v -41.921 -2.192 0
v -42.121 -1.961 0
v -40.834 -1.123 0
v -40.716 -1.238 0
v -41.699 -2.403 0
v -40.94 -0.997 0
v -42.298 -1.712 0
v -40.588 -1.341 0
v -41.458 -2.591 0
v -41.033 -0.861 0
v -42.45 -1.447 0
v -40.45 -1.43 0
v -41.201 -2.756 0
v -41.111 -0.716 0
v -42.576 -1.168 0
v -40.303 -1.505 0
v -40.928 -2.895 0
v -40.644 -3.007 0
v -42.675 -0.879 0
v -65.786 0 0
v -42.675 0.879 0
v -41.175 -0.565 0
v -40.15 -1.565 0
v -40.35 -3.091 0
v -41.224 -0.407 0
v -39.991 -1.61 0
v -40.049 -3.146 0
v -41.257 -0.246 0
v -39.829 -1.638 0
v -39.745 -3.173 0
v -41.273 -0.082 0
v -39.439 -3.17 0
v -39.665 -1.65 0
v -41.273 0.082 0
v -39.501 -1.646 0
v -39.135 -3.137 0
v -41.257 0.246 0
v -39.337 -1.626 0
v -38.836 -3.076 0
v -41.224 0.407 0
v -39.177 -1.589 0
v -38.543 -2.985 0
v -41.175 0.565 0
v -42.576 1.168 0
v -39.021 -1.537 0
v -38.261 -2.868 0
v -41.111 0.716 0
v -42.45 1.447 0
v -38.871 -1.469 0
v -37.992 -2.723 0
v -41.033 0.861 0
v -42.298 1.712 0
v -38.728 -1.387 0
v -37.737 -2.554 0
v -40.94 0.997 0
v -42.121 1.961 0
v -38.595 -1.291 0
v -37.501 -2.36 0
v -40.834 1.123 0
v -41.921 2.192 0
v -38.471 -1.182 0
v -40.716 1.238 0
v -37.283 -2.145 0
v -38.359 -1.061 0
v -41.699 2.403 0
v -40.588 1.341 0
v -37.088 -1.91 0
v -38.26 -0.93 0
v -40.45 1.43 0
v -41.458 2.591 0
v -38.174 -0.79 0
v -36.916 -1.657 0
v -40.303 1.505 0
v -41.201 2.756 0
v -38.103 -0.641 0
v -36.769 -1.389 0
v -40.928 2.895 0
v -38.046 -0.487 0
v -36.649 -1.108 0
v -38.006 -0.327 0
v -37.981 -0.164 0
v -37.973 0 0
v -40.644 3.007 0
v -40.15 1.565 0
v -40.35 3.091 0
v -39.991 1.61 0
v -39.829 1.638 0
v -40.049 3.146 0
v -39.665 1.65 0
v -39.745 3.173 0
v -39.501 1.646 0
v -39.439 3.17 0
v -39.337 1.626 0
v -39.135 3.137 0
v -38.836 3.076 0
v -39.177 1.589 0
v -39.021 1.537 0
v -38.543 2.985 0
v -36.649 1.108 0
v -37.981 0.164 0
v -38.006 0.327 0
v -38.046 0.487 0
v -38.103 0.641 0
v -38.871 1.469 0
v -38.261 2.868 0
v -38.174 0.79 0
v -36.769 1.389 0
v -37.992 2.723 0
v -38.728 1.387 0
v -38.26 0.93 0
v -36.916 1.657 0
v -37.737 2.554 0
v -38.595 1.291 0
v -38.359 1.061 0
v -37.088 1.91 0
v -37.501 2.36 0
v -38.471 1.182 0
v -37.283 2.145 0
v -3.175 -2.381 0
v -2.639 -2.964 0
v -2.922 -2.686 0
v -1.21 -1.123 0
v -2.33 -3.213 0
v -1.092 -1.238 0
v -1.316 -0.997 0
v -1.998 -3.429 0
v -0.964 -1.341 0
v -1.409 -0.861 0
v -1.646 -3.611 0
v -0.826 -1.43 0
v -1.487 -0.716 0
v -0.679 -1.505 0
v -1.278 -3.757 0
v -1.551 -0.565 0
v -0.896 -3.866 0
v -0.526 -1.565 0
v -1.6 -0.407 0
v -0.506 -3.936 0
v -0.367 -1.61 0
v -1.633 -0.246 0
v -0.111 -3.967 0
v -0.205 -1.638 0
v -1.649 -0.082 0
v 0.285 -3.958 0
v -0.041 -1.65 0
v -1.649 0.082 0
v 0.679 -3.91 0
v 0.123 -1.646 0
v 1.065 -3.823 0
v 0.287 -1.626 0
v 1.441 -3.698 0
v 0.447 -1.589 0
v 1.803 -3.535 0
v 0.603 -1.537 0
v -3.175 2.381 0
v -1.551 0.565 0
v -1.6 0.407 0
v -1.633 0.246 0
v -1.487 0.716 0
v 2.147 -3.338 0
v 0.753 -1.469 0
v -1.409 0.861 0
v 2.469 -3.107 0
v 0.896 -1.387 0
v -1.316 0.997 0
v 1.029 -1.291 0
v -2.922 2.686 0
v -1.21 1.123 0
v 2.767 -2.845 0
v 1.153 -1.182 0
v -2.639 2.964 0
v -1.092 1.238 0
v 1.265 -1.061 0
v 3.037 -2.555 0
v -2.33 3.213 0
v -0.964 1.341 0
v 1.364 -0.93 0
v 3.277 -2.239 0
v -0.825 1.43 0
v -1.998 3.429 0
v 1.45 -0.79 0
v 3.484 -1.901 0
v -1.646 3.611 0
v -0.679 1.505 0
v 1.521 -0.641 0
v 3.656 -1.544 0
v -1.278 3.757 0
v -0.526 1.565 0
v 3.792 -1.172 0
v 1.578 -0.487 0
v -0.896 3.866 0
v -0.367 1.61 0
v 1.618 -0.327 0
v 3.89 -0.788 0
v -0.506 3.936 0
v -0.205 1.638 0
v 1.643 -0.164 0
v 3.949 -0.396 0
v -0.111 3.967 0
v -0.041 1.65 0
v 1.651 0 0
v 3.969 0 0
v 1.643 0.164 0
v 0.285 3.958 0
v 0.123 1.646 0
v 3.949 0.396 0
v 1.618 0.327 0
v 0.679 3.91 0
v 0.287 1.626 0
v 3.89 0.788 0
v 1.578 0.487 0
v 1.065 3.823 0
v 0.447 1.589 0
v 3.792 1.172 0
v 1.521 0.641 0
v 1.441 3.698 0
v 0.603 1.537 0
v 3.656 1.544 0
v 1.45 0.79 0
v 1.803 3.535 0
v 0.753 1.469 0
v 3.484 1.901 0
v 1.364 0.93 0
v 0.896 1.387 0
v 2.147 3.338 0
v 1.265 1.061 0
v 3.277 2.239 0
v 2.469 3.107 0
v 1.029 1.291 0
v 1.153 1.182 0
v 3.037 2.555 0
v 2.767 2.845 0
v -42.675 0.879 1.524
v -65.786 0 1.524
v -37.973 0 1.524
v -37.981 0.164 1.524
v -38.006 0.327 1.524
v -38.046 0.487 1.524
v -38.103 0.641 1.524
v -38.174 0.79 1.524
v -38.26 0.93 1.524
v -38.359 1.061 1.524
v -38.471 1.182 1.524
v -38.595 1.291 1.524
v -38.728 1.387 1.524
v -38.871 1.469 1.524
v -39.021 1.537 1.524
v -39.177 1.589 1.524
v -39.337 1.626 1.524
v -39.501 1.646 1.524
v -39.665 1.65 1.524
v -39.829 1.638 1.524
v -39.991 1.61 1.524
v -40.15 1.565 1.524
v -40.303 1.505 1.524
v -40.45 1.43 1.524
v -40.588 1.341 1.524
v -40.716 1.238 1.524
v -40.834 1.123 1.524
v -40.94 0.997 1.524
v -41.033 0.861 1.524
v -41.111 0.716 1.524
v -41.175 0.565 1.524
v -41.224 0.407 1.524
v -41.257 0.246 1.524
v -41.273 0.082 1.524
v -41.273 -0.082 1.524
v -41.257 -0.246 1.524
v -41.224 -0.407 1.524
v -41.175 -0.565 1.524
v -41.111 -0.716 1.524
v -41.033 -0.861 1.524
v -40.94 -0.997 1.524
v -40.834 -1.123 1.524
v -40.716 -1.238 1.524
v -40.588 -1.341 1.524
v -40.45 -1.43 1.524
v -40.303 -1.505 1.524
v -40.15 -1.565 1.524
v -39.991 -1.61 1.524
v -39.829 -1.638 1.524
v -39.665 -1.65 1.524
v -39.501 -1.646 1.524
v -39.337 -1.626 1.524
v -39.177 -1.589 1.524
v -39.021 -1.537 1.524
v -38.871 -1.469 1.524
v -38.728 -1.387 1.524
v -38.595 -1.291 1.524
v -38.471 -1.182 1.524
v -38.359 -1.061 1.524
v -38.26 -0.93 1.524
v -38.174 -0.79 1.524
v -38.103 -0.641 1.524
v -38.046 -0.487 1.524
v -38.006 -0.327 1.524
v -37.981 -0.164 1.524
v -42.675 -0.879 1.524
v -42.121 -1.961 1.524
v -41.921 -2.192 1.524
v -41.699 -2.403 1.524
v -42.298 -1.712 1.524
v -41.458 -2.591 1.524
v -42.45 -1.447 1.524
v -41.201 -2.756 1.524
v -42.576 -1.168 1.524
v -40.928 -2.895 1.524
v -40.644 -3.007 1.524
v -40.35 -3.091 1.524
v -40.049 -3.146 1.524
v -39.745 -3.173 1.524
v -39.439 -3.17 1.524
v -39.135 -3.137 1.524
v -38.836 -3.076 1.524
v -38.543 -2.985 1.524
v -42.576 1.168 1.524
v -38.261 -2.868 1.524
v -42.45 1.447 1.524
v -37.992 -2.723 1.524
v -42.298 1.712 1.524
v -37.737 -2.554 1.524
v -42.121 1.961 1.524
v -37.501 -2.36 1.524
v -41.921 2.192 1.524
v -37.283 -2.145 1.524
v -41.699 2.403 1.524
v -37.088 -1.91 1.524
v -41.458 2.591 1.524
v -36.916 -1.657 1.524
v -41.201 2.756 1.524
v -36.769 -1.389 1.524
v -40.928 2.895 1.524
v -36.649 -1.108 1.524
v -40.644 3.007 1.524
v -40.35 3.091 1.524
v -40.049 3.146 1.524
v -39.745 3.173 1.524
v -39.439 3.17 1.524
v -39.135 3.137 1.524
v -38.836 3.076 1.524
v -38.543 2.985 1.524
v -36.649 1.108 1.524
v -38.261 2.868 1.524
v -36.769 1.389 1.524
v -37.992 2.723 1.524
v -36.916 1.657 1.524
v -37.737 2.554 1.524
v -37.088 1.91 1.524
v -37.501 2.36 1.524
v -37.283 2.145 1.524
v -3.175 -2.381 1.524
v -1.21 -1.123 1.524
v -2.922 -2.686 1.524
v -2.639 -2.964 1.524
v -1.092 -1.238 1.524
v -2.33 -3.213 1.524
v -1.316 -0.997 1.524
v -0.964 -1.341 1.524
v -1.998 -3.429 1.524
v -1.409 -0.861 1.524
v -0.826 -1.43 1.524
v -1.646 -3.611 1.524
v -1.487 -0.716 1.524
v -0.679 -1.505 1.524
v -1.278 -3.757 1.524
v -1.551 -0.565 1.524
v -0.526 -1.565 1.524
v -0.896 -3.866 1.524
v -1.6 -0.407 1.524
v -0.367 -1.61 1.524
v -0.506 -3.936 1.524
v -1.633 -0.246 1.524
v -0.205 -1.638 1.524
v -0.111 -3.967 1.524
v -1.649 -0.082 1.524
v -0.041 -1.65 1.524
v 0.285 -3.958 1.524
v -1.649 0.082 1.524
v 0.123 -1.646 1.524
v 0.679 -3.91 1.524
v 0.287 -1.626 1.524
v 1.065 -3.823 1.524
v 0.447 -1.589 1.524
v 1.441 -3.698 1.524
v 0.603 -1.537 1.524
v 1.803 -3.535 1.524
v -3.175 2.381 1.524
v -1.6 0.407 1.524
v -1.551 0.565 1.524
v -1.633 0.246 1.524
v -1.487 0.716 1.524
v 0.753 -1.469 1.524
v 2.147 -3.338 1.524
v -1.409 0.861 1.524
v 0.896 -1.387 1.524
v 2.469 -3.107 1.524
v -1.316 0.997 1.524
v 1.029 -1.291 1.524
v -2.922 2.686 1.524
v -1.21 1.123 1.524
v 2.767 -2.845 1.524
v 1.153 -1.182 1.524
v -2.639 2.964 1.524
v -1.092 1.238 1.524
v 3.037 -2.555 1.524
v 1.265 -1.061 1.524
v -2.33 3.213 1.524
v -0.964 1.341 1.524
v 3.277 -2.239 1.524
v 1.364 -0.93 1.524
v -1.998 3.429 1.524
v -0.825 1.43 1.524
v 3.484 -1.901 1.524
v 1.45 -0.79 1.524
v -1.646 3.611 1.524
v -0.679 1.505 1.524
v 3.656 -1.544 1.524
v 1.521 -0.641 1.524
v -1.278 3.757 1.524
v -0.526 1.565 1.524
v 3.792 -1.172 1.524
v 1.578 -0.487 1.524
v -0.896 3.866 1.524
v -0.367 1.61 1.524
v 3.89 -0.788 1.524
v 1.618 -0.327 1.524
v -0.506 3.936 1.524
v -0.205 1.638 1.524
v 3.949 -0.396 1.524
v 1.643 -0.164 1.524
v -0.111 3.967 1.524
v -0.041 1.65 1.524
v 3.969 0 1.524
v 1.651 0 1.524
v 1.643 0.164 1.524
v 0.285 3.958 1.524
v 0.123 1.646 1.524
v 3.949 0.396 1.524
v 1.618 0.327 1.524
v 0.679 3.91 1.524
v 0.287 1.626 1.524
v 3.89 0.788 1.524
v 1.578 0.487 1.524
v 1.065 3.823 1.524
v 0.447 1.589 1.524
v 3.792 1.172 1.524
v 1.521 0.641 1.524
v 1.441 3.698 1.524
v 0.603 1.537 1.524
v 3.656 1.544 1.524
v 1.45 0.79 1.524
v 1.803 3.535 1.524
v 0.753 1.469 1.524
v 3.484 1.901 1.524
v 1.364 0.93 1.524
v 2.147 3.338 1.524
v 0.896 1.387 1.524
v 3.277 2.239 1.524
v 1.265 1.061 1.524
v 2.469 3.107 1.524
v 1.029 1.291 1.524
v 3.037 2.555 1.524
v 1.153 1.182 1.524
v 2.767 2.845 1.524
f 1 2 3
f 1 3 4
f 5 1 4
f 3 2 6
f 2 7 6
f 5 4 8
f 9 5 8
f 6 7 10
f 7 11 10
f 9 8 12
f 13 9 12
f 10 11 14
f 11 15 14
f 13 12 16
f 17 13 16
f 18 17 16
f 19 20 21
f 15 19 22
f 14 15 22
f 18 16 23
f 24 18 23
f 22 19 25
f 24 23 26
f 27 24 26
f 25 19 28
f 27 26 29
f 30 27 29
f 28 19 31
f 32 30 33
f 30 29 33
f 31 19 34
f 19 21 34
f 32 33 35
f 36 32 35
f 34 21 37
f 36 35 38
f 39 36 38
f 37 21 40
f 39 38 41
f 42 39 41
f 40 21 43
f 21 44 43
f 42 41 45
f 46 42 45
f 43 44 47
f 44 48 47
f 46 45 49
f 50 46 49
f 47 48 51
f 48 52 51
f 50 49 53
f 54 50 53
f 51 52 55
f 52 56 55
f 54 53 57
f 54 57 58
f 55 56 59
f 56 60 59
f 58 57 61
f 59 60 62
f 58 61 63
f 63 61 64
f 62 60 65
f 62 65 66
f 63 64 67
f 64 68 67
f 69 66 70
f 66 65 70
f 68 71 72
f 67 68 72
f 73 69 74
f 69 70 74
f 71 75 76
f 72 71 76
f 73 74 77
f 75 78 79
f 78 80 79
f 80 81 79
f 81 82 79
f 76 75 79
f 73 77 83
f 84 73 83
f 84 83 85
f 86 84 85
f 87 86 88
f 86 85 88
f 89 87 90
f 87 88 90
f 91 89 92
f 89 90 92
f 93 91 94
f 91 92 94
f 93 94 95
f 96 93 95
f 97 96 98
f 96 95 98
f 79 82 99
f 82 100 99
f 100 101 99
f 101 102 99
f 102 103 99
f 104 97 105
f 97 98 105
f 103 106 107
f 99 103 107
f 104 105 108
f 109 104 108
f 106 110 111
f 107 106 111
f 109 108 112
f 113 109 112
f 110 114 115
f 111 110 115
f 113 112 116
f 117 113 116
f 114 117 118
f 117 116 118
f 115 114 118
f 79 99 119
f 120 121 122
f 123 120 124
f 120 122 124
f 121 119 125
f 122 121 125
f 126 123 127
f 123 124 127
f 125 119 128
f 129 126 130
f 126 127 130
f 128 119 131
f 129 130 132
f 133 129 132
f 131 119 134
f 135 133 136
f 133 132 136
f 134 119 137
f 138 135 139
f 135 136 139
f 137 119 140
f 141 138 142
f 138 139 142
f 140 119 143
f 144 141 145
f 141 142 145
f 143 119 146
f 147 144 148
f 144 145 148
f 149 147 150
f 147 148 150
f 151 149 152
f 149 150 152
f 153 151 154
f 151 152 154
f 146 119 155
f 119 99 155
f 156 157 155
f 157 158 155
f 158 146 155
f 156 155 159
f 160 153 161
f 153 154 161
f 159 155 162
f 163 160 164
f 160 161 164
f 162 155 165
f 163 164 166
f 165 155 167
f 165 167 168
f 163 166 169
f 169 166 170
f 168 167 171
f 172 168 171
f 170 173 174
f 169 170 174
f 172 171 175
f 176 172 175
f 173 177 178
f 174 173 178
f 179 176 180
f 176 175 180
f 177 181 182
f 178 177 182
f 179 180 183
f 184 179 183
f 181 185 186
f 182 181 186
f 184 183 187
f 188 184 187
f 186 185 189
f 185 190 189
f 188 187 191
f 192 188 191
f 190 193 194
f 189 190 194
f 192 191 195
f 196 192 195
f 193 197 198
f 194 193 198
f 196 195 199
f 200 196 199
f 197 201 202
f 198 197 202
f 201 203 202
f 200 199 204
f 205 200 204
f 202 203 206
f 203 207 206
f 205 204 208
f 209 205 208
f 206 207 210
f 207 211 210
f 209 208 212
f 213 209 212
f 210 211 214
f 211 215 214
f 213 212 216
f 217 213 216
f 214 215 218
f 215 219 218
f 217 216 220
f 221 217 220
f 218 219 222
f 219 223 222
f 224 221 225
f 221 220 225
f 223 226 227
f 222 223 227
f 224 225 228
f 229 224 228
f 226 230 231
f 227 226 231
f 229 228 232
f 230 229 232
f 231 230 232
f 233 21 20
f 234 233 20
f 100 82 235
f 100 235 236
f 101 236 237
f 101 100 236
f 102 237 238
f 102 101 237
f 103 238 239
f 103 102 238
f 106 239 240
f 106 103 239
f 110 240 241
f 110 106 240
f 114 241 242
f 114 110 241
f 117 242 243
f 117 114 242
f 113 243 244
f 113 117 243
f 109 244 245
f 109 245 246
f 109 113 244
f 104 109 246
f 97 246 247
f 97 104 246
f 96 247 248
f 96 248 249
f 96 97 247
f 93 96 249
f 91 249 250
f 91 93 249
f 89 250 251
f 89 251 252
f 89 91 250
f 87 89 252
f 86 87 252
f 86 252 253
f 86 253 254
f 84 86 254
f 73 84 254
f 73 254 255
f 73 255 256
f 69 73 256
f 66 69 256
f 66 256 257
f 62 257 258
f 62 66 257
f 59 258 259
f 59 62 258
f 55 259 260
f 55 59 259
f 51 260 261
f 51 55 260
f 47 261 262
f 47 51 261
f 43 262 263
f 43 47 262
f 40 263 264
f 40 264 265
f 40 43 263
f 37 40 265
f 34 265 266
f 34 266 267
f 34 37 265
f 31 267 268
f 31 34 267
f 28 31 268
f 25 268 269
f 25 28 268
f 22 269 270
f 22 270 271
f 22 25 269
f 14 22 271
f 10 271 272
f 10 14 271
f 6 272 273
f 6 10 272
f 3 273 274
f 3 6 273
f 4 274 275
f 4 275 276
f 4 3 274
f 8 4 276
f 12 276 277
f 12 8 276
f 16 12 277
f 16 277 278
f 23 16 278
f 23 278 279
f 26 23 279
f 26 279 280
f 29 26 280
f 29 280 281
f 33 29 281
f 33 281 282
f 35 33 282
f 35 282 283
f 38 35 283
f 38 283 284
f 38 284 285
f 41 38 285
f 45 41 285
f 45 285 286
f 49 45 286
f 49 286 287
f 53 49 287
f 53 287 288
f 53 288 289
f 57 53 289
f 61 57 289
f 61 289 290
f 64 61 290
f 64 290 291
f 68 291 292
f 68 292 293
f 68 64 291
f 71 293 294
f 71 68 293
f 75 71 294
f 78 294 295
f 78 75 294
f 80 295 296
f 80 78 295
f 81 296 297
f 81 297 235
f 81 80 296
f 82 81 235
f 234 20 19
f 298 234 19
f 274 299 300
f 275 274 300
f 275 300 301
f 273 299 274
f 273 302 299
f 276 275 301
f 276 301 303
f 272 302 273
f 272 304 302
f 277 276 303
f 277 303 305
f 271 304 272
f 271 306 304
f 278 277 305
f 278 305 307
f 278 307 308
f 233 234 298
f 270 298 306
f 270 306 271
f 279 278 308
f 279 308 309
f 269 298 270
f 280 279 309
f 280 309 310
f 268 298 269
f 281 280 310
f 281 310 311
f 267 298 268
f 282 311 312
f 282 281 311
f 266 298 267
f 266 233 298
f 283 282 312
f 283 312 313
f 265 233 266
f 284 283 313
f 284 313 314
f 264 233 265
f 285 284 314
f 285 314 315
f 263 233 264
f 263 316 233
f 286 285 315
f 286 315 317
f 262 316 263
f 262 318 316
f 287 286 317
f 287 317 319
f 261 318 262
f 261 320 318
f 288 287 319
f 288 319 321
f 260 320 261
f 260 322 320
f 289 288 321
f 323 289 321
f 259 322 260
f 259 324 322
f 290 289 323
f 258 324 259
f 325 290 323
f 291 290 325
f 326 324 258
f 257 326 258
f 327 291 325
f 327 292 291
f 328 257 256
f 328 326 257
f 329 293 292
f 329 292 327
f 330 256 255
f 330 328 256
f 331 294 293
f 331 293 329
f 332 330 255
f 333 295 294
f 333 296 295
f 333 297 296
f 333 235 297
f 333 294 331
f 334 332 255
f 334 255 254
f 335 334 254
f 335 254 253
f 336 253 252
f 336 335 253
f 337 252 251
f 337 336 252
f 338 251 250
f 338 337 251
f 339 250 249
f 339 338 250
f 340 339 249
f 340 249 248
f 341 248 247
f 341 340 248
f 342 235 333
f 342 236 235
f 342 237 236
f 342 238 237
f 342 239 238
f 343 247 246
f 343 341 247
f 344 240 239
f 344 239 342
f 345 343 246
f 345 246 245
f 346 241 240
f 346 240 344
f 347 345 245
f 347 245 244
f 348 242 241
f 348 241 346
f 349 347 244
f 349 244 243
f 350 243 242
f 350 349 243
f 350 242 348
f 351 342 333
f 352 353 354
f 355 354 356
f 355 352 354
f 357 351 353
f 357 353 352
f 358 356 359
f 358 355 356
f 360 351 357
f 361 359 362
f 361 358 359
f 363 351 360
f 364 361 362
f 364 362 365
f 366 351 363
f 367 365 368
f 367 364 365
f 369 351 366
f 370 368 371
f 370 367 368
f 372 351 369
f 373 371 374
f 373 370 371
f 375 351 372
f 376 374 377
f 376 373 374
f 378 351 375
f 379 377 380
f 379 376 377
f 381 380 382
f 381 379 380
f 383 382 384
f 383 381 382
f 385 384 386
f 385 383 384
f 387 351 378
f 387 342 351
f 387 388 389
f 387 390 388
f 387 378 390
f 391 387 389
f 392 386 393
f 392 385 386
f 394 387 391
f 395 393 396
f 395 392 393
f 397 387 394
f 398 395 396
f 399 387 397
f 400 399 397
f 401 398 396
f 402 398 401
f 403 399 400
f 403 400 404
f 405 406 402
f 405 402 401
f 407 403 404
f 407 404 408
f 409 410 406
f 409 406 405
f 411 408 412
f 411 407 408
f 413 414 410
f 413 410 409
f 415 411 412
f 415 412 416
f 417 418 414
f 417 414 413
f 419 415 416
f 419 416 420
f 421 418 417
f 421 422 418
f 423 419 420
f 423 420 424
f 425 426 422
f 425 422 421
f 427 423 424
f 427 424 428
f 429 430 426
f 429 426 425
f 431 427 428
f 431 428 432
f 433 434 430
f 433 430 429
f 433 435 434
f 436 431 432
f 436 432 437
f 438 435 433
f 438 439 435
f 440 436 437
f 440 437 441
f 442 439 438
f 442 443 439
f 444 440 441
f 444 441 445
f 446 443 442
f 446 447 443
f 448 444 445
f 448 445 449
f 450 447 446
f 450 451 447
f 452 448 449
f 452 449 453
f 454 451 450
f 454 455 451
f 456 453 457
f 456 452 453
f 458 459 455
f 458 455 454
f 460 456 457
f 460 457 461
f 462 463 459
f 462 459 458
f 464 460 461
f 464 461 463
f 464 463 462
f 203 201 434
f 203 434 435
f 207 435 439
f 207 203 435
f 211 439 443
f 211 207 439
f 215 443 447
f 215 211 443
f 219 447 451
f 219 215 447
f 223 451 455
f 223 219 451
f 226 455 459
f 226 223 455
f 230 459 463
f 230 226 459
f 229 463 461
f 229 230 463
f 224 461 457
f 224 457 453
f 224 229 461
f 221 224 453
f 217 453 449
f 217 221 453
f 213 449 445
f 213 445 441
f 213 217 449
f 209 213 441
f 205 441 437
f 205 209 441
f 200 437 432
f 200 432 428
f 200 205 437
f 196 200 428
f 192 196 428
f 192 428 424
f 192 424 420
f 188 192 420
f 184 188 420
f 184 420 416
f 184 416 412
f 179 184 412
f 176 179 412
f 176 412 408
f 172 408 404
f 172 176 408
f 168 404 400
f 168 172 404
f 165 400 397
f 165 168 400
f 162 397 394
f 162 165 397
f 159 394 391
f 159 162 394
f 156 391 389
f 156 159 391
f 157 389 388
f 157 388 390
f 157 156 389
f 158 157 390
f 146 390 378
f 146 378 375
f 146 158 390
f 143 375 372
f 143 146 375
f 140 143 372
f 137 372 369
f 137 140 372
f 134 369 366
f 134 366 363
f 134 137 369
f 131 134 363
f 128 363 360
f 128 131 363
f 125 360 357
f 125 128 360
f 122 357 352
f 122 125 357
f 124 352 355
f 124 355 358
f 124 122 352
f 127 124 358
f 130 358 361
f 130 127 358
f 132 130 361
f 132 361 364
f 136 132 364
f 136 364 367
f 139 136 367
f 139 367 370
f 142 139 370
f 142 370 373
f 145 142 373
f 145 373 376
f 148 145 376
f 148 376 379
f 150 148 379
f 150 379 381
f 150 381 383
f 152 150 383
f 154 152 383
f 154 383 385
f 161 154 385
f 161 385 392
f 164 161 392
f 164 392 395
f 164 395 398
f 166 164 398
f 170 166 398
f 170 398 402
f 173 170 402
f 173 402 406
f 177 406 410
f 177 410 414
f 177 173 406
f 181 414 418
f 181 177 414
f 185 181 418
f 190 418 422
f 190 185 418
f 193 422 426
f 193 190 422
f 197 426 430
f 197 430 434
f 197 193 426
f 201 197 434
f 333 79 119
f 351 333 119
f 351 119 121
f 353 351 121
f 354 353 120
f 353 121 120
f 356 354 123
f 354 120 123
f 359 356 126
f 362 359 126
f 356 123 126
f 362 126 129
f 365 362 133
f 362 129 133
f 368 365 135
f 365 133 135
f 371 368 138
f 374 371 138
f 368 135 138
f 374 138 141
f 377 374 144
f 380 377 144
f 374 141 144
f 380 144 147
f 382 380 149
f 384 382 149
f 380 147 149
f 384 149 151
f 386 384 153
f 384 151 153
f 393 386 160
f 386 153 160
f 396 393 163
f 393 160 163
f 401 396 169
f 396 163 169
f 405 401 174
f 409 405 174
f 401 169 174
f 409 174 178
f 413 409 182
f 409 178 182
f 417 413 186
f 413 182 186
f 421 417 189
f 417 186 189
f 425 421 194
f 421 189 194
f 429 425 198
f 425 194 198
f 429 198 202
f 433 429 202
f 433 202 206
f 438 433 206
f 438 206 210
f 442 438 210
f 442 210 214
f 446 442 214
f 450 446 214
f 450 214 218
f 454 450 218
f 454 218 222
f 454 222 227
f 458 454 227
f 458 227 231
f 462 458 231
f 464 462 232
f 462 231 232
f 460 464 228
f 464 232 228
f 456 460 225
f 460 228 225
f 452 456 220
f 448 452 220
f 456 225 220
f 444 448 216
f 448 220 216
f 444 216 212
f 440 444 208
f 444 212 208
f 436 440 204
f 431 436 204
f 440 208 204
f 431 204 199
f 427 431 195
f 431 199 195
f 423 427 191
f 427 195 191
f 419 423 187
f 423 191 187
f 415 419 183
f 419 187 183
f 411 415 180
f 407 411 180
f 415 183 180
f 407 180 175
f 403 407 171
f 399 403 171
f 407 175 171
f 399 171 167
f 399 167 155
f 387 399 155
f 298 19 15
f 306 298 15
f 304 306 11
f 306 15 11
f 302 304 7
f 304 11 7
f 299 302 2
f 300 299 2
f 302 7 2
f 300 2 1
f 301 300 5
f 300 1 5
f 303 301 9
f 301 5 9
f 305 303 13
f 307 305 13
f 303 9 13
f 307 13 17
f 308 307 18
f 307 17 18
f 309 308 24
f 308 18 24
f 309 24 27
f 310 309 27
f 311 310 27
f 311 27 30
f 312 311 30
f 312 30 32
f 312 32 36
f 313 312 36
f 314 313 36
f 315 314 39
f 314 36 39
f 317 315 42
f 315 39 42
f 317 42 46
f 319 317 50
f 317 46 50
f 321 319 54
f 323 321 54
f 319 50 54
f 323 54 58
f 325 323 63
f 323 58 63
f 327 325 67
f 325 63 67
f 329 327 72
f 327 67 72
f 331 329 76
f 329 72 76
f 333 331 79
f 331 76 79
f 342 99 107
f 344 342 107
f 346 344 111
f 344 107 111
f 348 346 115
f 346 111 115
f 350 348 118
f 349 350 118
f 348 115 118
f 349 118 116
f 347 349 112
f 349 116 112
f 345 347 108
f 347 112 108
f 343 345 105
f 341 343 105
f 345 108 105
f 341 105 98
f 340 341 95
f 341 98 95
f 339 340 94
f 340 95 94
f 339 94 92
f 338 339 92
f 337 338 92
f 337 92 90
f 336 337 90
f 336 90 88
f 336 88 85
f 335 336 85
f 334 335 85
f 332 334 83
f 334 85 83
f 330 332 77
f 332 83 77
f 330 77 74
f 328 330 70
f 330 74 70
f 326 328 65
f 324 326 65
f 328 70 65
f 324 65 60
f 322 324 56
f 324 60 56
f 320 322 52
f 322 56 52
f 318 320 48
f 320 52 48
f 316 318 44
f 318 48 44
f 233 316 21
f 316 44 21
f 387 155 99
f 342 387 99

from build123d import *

# Parameters (mm, degrees)
F0_R     = 1.651
F1_DEPTH = 1.524


with BuildPart() as f1:
    # F0 (on Top) → F1 (new body)
    with BuildSketch(Plane.XY):
        with BuildLine():
            Line((-36.648669, -1.108164), (-3.175, -2.38125))
            ThreePointArc((-3.175, -2.38125), (3.96875, 0), (-3.175, 2.38125))
            Line((-3.175, 2.38125), (-36.648669, 1.108164))
            ThreePointArc((-36.648669, 1.108164), (-39.744666, 3.172706), (-42.674907, 0.878972))
            Line((-42.674907, 0.878972), (-65.786, 0))
            Line((-65.786, 0), (-42.674907, -0.878972))
            ThreePointArc((-42.674907, -0.878972), (-39.744666, -3.172706), (-36.648669, -1.108164))
        make_face()
        with Locations((-39.624, 0)):
            Circle(F0_R, mode=Mode.SUBTRACT)
        Circle(F0_R, mode=Mode.SUBTRACT)
    extrude(amount=F1_DEPTH)


solid = f1.part
